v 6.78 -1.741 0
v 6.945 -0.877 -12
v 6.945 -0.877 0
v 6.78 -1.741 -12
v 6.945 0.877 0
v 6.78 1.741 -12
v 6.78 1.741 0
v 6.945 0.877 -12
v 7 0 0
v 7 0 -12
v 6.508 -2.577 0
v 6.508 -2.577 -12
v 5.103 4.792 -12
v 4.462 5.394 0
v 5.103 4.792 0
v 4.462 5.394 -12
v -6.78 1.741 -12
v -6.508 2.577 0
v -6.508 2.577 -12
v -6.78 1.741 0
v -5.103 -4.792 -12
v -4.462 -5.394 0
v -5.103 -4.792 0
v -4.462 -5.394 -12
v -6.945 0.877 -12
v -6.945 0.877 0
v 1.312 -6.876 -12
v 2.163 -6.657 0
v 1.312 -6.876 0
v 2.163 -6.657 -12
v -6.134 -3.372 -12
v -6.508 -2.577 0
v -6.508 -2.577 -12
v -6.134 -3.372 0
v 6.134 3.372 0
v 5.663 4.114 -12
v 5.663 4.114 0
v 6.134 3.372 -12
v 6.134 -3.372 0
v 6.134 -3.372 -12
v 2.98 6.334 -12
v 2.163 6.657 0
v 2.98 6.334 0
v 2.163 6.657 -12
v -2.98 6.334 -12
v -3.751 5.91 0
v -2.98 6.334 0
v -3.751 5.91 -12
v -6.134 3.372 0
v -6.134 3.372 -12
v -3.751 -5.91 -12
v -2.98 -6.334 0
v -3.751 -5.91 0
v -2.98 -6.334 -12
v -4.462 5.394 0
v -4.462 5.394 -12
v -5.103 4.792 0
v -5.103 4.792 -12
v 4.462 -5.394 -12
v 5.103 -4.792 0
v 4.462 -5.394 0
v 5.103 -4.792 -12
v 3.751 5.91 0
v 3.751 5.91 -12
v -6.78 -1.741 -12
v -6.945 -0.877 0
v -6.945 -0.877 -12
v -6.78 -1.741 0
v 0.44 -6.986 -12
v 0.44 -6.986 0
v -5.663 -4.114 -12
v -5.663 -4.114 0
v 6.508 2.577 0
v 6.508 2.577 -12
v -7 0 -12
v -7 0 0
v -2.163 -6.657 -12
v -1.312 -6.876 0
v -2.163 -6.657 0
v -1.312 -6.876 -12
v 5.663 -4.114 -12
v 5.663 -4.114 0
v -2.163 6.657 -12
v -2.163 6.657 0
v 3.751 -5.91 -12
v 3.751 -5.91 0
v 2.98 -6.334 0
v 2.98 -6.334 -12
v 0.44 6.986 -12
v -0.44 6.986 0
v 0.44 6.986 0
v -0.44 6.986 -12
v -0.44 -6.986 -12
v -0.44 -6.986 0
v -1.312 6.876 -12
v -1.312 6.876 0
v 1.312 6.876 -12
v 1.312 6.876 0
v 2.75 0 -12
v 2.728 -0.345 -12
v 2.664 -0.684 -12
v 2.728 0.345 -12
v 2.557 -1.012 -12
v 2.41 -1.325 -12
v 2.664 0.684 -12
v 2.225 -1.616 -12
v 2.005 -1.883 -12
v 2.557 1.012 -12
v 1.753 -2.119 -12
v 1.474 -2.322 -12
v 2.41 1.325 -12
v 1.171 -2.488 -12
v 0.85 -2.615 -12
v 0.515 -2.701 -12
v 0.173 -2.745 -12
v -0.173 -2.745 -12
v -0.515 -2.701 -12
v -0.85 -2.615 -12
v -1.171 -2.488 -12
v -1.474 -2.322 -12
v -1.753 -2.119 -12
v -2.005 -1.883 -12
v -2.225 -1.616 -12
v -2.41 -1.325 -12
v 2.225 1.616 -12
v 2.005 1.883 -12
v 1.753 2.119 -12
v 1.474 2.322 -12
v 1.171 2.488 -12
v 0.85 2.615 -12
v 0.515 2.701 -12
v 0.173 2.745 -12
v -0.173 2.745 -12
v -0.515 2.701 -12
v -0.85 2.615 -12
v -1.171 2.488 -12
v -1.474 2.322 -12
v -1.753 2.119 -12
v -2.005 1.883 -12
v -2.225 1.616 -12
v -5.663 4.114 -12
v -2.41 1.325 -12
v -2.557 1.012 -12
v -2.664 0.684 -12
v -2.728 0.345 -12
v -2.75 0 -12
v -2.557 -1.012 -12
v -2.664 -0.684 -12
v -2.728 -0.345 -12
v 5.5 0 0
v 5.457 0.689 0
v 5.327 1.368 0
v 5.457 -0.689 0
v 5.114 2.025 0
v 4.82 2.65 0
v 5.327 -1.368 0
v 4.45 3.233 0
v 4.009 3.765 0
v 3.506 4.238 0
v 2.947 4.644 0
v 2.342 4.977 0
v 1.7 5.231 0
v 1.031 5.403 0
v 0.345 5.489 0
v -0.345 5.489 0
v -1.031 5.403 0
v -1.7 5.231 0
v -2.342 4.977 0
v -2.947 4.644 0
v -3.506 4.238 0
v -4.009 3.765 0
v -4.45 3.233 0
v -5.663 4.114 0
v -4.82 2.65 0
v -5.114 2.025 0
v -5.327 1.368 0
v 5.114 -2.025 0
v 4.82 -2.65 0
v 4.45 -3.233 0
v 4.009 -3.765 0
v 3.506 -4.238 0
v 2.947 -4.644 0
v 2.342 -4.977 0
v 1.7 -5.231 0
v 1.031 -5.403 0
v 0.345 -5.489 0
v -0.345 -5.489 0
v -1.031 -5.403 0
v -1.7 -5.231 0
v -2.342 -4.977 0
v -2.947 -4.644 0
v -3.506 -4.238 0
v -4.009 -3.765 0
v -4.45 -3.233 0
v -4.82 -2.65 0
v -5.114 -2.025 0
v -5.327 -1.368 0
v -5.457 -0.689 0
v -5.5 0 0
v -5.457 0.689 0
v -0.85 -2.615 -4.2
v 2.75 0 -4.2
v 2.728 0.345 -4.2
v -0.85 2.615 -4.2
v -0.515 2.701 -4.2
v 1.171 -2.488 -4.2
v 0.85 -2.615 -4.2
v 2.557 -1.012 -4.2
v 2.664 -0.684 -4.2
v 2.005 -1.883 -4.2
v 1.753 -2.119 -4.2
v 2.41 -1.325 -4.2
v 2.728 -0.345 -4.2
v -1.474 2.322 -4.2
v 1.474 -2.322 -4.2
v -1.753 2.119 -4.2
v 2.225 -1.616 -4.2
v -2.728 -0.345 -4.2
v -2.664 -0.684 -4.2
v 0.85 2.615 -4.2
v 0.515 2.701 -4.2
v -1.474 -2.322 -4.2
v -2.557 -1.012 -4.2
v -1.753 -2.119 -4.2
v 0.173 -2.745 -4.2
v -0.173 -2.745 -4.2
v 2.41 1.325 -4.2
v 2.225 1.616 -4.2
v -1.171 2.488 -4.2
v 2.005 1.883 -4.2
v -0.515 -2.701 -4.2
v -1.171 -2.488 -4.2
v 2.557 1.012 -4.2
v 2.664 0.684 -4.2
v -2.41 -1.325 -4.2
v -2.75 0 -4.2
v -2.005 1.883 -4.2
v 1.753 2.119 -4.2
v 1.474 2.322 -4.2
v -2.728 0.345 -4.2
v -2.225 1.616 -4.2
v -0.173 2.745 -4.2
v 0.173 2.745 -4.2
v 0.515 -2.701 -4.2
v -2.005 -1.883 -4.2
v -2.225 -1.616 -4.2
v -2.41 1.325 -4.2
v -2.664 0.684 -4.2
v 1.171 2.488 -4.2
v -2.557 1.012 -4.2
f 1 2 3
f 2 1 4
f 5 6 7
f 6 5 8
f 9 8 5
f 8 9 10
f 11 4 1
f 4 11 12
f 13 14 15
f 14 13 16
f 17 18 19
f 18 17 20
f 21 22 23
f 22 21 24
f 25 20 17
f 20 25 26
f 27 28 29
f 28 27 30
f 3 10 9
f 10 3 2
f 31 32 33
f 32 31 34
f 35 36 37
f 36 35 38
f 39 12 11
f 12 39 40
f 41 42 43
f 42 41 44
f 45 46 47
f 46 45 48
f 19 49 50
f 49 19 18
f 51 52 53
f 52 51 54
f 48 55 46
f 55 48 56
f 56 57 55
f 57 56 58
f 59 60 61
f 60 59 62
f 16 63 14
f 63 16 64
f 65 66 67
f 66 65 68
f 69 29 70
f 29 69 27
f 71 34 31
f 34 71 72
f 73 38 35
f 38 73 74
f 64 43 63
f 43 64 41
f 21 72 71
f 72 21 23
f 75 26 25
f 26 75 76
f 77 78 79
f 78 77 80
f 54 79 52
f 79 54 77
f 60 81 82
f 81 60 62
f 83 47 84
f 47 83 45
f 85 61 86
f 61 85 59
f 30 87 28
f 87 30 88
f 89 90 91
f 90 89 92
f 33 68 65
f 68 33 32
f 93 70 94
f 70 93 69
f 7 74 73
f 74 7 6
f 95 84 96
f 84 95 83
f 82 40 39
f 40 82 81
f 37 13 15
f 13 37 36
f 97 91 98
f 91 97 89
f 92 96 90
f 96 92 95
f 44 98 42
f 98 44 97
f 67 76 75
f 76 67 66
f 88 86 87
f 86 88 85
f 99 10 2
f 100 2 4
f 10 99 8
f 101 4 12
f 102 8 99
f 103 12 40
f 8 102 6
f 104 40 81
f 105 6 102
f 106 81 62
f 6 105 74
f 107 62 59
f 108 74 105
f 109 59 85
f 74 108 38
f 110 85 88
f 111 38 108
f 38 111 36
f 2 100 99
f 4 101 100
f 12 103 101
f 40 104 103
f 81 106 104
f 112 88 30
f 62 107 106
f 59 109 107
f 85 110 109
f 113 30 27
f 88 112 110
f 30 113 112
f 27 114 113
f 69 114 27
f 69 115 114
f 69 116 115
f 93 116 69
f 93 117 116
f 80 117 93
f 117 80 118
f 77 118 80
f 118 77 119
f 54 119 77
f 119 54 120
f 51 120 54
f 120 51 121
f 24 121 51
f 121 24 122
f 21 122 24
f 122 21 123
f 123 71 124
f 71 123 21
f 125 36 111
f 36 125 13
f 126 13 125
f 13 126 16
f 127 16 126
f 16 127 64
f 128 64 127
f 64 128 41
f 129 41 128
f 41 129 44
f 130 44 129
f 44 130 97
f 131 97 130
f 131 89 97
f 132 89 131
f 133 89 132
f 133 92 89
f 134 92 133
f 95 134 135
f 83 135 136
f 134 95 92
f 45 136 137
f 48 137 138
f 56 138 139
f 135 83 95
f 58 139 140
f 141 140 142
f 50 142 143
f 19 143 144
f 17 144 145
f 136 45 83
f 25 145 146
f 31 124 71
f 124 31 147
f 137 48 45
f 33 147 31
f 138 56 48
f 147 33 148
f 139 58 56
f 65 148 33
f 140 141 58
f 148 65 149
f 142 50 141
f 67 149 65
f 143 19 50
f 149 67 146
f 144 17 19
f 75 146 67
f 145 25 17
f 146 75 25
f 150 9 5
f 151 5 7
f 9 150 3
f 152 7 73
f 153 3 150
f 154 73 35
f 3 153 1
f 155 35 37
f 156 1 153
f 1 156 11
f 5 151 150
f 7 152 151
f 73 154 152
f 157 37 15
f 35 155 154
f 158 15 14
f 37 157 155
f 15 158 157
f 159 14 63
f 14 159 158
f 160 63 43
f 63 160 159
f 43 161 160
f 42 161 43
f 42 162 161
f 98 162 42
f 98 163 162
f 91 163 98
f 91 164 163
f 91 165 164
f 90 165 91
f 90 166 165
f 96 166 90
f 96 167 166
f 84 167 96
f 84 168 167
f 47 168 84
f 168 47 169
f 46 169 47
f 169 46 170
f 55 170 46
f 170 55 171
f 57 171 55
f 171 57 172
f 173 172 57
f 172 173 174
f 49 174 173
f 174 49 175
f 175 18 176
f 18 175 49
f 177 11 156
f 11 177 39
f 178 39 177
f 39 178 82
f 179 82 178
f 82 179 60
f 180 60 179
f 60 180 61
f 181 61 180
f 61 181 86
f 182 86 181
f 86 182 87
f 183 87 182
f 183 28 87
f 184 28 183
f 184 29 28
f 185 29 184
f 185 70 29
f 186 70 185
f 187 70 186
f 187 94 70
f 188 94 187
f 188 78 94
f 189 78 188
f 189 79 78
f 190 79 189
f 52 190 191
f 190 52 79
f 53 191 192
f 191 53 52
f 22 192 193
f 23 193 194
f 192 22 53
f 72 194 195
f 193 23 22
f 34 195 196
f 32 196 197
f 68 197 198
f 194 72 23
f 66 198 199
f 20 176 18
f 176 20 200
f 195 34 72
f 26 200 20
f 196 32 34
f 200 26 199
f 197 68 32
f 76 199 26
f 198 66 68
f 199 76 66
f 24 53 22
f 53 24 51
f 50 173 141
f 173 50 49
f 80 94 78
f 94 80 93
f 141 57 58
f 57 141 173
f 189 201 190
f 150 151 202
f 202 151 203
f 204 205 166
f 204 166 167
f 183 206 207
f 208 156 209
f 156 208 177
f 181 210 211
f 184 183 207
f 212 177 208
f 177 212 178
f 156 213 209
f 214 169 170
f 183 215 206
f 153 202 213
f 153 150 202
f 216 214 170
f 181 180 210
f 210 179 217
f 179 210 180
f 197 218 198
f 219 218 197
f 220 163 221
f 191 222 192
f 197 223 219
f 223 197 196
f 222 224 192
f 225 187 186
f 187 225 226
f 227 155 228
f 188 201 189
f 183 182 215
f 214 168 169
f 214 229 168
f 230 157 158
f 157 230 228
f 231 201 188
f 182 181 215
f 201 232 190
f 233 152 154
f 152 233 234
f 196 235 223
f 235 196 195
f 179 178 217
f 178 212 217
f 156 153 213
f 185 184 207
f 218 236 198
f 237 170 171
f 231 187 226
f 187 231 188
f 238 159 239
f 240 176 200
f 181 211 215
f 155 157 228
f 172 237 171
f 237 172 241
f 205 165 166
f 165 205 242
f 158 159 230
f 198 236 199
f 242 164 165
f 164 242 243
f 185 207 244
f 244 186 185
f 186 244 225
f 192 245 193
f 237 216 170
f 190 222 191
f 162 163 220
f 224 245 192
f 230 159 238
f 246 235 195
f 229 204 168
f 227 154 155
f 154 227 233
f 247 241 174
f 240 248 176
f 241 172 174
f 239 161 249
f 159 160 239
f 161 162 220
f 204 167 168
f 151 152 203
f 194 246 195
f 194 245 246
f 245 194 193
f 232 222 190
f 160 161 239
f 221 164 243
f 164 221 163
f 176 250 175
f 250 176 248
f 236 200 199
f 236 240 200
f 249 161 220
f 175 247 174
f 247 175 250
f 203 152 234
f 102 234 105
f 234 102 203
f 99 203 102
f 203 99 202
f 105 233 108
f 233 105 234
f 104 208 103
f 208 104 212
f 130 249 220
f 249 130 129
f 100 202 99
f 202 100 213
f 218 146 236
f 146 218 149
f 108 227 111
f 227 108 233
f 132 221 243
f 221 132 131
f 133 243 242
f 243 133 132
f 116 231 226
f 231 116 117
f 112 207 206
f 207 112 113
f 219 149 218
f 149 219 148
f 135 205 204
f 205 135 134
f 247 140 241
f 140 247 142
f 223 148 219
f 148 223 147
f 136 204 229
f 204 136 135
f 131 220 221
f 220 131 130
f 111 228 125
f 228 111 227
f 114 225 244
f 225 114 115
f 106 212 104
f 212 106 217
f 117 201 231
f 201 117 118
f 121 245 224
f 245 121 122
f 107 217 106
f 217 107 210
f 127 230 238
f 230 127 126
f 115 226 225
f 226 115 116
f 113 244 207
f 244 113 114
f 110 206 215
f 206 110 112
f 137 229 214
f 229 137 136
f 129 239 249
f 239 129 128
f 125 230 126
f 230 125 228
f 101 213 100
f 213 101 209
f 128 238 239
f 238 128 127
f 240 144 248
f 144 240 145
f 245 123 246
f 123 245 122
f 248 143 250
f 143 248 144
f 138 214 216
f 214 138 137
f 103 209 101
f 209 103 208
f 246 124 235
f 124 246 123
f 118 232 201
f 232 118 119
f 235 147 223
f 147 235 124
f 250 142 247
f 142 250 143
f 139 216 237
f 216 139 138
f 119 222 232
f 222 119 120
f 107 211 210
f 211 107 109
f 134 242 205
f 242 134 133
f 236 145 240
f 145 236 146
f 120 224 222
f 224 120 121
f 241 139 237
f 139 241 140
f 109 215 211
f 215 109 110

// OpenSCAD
$fn = 50;


difference() {
	union() {
		translate(v = [0, 0, -12.0000000000]) {
			cylinder(h = 12, r = 7.0000000000);
		}
		translate(v = [0, 0, -12.0000000000]) {
			cylinder(h = 12, r = 2.8750000000);
		}
	}
	union() {
		translate(v = [0, 0, 0]) {
			rotate(a = [0, 0, 0]) {
				difference() {
					union() {
						translate(v = [0, 0, -12.0000000000]) {
							cylinder(h = 12, r = 2.2500000000);
						}
						translate(v = [0, 0, -4.2000000000]) {
							cylinder(h = 4.2000000000, r1 = 2.7500000000, r2 = 5.5000000000);
						}
						translate(v = [0, 0, -12.0000000000]) {
							cylinder(h = 12, r = 2.7500000000);
						}
						translate(v = [0, 0, -12.0000000000]) {
							cylinder(h = 12, r = 2.2500000000);
						}
					}
					union();
				}
			}
		}
	}
}
